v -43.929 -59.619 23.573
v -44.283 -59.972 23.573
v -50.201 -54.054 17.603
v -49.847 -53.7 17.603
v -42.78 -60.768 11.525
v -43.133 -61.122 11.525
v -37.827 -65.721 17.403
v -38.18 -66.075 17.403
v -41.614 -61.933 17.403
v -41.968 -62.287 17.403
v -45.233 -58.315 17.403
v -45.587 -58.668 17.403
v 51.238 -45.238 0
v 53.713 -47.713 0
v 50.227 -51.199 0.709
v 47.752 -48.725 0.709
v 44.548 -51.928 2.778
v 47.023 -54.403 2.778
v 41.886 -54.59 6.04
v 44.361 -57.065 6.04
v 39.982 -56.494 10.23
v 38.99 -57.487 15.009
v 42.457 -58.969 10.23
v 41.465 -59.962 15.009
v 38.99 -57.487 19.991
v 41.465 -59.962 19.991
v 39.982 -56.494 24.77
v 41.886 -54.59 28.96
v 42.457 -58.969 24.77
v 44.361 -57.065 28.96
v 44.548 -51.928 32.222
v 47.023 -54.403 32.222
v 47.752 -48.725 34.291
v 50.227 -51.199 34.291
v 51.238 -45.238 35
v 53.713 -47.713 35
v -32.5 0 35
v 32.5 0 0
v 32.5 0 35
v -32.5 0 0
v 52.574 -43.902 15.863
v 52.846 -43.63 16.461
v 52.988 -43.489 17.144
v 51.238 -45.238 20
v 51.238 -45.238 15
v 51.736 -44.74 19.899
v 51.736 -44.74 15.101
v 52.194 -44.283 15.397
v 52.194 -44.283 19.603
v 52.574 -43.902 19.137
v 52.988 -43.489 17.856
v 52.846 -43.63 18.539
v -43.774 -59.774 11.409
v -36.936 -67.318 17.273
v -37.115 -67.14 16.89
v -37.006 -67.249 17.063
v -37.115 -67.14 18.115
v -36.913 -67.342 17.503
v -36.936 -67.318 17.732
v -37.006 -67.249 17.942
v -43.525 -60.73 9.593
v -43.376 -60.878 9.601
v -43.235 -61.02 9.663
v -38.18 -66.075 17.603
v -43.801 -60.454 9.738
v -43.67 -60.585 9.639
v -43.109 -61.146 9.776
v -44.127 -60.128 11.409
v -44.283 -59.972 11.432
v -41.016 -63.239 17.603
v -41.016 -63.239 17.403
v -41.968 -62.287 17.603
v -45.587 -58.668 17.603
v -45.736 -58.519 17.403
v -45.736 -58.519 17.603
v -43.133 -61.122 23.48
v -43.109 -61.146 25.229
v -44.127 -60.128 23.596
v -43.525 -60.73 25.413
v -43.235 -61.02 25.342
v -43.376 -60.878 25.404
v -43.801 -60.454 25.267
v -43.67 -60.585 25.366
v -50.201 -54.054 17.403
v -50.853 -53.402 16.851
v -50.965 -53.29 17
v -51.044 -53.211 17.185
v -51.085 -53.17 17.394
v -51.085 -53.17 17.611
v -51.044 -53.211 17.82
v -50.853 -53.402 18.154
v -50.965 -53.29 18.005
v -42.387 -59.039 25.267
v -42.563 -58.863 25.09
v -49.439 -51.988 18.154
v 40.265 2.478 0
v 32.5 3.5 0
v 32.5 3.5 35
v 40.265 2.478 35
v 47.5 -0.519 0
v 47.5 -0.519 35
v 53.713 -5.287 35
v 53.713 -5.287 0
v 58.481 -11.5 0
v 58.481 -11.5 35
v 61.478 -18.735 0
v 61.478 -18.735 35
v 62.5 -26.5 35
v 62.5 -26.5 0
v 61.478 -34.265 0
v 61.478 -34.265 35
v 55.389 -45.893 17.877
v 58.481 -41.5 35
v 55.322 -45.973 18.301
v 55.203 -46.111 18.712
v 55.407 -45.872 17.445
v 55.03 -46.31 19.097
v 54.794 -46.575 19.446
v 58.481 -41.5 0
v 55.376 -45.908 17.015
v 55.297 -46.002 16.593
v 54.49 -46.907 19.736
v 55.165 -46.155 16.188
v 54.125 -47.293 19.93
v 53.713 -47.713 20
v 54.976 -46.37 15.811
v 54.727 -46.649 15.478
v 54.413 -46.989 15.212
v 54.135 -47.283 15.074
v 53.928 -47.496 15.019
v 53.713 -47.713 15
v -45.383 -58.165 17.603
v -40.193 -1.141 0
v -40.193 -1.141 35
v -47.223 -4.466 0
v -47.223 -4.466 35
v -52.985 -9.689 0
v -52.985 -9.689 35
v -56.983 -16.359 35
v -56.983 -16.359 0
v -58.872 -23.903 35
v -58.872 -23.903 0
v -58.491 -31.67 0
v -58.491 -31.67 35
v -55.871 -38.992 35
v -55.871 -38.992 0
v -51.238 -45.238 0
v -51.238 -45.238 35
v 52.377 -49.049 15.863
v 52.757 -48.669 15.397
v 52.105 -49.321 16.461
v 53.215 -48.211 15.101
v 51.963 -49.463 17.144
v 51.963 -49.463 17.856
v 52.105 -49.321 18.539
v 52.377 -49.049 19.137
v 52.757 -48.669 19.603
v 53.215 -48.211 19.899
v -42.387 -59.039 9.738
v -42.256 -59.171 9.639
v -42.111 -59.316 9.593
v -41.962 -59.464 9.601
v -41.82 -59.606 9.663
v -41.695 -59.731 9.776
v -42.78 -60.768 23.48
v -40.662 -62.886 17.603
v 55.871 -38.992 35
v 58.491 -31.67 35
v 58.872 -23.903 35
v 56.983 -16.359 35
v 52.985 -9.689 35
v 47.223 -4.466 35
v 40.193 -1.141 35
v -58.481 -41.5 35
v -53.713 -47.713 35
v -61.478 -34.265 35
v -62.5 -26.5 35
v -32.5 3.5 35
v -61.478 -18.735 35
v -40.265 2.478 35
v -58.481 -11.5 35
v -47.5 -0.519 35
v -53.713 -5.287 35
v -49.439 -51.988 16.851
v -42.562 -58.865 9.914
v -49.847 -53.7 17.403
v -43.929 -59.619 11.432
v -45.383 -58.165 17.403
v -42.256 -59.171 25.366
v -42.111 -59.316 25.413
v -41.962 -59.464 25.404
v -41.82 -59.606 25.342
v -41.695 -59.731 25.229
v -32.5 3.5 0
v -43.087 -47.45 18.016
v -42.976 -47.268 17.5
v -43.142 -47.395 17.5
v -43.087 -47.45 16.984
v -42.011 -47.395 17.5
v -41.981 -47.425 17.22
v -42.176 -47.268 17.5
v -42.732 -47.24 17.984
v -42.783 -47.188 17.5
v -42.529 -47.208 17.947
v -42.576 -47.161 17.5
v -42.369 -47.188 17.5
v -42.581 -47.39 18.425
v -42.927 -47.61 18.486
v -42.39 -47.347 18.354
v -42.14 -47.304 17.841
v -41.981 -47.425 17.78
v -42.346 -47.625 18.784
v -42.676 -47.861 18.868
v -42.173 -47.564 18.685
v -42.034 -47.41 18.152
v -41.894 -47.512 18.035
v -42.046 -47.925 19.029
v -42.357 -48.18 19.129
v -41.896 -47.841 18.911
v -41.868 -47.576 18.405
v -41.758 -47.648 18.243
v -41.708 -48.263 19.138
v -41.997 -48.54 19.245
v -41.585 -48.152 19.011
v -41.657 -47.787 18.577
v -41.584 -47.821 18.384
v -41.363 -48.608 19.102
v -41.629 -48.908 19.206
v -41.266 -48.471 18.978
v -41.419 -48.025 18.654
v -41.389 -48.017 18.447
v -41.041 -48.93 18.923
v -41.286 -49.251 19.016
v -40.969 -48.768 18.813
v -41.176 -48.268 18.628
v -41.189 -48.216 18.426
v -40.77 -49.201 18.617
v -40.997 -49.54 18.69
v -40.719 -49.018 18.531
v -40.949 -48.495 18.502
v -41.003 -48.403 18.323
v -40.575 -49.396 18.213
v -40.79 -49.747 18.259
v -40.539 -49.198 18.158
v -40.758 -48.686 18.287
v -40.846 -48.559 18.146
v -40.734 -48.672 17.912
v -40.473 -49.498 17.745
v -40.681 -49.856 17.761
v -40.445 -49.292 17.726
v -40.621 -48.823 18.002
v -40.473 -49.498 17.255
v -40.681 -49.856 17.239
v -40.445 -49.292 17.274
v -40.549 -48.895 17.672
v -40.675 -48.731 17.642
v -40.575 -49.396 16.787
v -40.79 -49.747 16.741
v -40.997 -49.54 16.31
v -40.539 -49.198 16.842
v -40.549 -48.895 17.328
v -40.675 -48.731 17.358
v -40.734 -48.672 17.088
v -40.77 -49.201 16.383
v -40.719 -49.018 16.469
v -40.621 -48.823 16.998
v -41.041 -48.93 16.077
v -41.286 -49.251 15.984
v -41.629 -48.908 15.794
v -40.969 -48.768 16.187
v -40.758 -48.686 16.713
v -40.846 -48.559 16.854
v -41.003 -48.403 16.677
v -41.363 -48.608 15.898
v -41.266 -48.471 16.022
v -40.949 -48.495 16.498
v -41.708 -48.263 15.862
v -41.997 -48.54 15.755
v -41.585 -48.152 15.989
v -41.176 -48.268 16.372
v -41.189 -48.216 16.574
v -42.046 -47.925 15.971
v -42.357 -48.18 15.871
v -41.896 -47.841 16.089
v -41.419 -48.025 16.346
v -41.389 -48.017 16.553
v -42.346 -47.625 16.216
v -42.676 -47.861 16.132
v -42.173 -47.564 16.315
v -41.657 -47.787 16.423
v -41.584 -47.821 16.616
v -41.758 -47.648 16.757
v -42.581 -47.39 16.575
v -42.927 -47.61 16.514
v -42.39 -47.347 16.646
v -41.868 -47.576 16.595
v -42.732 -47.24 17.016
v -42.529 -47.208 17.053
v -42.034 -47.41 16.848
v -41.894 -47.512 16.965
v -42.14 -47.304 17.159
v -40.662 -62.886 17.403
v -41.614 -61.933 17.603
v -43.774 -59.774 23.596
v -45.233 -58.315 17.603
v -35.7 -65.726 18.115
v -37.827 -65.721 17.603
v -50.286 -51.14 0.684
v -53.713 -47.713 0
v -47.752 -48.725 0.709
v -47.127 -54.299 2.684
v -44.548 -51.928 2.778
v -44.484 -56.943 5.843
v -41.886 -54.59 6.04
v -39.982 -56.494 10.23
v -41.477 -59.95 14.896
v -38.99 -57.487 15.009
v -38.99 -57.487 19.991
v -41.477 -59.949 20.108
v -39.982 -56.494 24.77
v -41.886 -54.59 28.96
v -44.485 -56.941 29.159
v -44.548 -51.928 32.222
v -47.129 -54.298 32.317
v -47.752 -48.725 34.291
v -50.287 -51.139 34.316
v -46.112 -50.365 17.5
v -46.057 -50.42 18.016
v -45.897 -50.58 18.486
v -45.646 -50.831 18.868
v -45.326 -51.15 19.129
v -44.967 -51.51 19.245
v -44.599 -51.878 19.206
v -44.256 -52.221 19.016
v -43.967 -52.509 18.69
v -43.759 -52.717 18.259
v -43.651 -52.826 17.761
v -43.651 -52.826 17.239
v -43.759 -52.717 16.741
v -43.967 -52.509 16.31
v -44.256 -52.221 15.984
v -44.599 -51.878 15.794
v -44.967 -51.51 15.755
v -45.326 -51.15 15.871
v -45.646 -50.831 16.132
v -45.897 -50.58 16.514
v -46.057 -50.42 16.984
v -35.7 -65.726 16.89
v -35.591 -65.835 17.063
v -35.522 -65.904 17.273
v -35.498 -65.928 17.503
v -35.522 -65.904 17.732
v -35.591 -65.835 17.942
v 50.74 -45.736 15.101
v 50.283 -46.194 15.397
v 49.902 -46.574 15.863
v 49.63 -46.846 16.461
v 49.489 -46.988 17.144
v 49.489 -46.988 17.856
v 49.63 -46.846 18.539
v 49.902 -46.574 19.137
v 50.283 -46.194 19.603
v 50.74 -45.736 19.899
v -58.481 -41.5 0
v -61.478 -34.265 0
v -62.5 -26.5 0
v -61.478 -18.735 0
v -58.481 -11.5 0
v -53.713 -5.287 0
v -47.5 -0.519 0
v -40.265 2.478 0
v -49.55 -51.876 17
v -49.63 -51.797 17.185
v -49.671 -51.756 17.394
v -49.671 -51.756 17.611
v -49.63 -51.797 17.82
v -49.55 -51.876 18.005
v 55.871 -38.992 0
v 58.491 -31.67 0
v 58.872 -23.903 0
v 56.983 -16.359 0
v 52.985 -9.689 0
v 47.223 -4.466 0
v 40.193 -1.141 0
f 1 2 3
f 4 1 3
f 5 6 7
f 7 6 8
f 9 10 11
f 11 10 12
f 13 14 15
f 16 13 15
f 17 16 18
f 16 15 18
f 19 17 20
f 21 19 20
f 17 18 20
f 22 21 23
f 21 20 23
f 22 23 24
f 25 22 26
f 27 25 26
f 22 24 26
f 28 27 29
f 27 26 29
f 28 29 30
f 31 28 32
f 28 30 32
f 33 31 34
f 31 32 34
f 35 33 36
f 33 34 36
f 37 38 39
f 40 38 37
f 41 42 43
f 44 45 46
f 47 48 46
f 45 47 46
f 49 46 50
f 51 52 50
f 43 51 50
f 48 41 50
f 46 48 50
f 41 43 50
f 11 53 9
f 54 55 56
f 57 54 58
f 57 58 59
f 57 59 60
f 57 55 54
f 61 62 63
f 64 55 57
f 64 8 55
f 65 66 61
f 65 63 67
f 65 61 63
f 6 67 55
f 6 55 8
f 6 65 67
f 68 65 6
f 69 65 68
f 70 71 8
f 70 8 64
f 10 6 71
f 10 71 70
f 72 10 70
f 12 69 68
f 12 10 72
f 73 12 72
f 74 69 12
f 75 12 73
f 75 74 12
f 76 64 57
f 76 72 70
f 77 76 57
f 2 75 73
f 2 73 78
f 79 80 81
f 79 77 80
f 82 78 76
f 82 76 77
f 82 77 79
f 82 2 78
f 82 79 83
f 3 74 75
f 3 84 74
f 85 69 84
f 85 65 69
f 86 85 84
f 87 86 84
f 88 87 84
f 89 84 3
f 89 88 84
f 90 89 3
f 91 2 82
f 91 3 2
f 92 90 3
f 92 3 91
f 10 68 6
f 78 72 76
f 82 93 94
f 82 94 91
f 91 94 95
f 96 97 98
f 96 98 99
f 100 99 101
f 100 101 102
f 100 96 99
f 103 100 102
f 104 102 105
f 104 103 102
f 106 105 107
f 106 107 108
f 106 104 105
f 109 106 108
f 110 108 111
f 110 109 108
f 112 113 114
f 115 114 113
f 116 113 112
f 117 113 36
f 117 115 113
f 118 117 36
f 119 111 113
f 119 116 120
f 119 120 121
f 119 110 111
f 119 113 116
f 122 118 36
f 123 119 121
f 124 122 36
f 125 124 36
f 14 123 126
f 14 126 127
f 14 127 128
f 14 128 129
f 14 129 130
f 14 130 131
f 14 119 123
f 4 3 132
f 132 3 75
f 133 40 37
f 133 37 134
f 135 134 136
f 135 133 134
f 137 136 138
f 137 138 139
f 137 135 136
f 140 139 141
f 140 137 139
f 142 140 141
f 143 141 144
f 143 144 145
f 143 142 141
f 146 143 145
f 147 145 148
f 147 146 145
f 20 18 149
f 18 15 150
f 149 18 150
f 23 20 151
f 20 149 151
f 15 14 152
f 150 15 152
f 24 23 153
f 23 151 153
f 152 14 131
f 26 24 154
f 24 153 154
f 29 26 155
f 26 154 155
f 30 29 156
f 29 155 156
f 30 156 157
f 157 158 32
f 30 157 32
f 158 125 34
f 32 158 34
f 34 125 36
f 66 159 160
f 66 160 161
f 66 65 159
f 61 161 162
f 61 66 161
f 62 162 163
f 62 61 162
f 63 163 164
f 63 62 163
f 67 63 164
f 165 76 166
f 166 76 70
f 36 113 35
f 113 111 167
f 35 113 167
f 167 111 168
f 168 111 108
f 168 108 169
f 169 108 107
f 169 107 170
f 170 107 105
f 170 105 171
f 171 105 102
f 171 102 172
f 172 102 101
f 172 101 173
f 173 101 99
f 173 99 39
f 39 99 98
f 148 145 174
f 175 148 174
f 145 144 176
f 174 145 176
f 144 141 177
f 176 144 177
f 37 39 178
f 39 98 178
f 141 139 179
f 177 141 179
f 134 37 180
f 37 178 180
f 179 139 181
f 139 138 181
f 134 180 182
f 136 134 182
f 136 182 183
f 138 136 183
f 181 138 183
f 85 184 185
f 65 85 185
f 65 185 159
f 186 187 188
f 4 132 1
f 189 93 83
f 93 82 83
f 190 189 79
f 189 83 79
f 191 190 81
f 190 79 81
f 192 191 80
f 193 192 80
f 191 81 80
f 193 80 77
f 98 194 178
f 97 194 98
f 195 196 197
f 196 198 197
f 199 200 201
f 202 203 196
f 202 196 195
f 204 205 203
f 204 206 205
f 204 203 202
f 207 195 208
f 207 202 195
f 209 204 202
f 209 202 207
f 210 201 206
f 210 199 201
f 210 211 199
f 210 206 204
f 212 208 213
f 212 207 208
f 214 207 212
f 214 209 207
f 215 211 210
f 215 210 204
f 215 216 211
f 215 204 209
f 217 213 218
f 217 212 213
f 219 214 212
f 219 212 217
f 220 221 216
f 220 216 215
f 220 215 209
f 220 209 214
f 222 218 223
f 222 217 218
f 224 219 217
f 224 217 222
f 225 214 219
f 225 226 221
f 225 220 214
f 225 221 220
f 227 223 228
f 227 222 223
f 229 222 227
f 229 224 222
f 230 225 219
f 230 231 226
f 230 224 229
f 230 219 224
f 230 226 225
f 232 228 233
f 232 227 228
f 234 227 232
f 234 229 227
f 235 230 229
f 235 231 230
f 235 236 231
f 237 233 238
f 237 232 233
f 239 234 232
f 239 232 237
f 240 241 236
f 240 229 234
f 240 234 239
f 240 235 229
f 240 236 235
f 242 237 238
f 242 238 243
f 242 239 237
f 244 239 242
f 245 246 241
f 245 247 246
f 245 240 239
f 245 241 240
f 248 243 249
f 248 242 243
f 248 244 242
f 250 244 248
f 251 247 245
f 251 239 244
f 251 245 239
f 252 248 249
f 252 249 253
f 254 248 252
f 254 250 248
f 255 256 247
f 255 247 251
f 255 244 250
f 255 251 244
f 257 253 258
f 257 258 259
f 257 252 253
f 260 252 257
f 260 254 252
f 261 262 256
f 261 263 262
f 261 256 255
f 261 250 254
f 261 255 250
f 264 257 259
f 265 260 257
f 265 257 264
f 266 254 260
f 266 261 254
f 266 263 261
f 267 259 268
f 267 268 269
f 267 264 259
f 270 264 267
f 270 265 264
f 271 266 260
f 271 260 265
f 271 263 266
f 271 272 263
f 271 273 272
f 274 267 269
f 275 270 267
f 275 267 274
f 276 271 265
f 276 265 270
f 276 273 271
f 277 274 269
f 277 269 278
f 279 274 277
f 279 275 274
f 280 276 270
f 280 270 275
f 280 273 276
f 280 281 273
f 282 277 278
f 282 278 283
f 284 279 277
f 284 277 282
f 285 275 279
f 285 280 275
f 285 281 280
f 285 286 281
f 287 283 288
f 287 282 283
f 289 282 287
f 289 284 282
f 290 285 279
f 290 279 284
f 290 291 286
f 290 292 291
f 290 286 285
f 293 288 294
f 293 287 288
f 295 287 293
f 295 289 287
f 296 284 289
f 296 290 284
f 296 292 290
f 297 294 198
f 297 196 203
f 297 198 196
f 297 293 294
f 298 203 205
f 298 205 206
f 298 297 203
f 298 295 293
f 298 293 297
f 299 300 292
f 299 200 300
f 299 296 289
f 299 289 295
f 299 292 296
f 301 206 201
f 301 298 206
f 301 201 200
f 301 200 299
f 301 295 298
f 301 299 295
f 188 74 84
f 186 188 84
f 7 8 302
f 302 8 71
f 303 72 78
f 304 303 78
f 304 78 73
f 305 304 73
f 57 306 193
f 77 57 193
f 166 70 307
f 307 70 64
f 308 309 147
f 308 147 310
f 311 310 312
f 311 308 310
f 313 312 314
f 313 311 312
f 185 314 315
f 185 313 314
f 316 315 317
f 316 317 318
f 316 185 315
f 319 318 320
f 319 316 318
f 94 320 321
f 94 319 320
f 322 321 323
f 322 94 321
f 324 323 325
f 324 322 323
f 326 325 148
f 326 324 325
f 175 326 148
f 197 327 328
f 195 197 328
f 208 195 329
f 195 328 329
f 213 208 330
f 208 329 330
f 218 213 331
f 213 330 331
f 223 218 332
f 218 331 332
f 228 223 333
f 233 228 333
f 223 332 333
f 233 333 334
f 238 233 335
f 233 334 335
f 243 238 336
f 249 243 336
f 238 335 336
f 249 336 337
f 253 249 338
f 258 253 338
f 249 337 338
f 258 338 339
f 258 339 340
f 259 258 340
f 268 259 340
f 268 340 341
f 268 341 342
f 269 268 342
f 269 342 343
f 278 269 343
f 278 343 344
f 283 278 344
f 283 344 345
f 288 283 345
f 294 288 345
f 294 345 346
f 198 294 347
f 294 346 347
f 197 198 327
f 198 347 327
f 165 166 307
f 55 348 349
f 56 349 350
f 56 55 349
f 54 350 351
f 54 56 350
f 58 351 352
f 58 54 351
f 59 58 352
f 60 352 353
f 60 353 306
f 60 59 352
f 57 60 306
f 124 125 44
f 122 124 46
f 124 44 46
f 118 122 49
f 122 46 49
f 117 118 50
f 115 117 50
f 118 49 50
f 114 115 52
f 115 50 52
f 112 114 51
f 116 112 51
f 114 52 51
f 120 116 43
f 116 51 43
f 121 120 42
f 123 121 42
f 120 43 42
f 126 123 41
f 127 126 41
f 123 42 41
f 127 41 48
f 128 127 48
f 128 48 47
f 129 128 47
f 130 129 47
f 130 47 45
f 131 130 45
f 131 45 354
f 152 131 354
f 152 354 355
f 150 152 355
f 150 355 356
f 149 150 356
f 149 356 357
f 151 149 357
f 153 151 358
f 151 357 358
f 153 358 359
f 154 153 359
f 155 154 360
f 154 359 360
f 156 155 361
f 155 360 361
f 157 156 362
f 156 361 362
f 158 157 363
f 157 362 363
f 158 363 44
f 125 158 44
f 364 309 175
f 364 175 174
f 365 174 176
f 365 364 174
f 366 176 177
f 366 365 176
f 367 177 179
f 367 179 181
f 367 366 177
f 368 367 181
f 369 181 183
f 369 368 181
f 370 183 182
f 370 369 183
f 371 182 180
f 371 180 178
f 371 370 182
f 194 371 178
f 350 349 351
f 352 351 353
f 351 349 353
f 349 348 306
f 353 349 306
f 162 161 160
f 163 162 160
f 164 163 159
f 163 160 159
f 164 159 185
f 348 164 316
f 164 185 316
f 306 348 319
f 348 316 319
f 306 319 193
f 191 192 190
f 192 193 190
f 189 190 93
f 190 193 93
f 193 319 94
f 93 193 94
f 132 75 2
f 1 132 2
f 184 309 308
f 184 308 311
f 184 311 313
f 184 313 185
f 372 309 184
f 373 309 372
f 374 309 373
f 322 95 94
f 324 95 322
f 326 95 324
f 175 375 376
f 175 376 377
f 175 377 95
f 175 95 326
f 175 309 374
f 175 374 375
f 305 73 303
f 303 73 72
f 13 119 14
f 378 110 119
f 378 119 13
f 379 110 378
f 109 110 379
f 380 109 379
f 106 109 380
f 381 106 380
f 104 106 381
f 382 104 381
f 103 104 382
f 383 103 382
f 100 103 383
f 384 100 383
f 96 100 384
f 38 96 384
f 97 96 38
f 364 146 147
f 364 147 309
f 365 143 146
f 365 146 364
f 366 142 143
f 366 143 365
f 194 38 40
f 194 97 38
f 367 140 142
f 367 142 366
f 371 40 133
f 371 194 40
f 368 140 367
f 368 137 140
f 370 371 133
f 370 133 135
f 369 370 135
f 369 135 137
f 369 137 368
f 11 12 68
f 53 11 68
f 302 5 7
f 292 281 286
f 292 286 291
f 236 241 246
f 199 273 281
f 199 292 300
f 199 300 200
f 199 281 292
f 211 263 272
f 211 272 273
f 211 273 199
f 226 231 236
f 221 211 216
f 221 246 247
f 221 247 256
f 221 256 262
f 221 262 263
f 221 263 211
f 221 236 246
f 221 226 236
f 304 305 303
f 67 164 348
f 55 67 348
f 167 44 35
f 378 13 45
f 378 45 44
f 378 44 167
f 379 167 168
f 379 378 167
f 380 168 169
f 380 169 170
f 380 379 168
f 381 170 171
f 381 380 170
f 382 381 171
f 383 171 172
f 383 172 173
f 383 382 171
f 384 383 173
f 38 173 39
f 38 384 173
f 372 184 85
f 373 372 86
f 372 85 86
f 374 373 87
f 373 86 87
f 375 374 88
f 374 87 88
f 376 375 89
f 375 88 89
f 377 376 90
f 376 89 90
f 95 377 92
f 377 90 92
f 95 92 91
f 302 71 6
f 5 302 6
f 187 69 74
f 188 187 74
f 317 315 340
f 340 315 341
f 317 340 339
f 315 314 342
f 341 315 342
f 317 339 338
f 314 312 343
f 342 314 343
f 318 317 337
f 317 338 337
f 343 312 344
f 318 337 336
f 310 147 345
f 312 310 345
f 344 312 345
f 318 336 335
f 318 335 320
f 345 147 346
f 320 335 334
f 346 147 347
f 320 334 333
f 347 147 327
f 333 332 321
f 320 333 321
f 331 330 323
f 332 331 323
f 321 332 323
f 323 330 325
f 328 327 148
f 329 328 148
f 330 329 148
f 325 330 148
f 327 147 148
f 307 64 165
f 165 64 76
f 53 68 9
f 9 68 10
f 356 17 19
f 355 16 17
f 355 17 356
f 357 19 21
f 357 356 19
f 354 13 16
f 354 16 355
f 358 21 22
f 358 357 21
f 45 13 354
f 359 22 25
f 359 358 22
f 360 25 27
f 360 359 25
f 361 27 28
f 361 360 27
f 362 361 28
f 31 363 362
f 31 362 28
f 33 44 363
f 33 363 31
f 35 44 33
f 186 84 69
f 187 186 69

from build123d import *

# Parameters (mm, degrees)
BOSS_EXTRUDE1_DEPTH = 35
BOSS_EXTRUDE2_DEPTH = 3.5
BOSS_EXTRUDE3_DEPTH = 2
CUT_EXTRUDE2_DEPTH  = 0.5
FILLET1_R           = 0.8
SKETCH5_R           = 1.75
BOSS_EXTRUDE4_DEPTH = 5
FILLET2_R           = 0.8
SKETCH6_R           = 2.5
CUT_EXTRUDE4_DEPTH  = 128.140994275


with BuildPart() as part:
    # Sketch1 → Boss-Extrude1 (new body)
    with BuildSketch(Plane.XY):
        with BuildLine():
            ThreePointArc((32.5, 3.5), (60.216385975, -15.019497029), (53.713203436, -47.713203436))
            Line((53.713203436, -47.713203436), (51.238329701, -45.238329701))
            ThreePointArc((51.238329701, -45.238329701), (56.982807612, -16.358889042), (32.5, 0))
            Line((32.5, 0), (-32.5, 0))
            ThreePointArc((-32.5, 0), (-56.982807612, -16.358889042), (-51.238329701, -45.238329701))
            Line((-51.238329701, -45.238329701), (-53.713203436, -47.713203436))
            ThreePointArc((-53.713203436, -47.713203436), (-60.216385975, -15.019497029), (-32.5, 3.5))
            Line((-32.5, 3.5), (32.5, 3.5))
        make_face()
    extrude(amount=BOSS_EXTRUDE1_DEPTH)

    # Sketch2 → Boss-Extrude2 (add)
    with BuildSketch(Plane(origin=(-50.713203436, -50.713203436, 0), x_dir=(0, 0, 1), z_dir=(-0.7071067811865488, -0.7071067811865464, 0))):
        with BuildLine():
            Line((35, 4.242640687), (0, 4.242640687))
            ThreePointArc((0, 4.242640687), (17.5, -13.257359313), (35, 4.242640687))
        make_face()
    boss_extrude2 = extrude(amount=-BOSS_EXTRUDE2_DEPTH)

    # Mirror1: Boss-Extrude2 across plane
    add(boss_extrude2.mirror(Plane(origin=(0, 0, 0), x_dir=(0, 0, 1), z_dir=(1, 0, 0))))

    # Sketch3 → Boss-Extrude3 (add)
    with BuildSketch(Plane(origin=(-50.713203436, -50.713203436, 0), x_dir=(0, 0, 1), z_dir=(-0.7071067811865487, -0.7071067811865465, 0))):
        Polygon((17.502560815, -0.889154327), (9.378087293, -12.279246125), (17.502560815, -21.961616632), (25.627034337, -12.279246125), align=None)
    extrude(amount=BOSS_EXTRUDE3_DEPTH)

    # Sketch4 → Cut-Extrude2 (cut)
    with BuildSketch(Plane(origin=(-52.127416998, -52.127416998, 0), x_dir=(0, 0, 1), z_dir=(-0.7071067811865486, -0.7071067811865465, 0))):
        Polygon((11.432409465, -11.094265864), (17.402560815, -9.038577899), (17.402560815, -2.724422361), align=None)
        Polygon((17.602560815, -9.038577899), (23.572712164, -11.094265864), (17.602560815, -2.724422361), align=None)
        Polygon((17.402560815, -9.250102035), (11.40902714, -11.31384118), (17.402560815, -14.36769912), align=None)
        Polygon((17.602560815, -14.36769912), (23.59609449, -11.31384118), (17.602560815, -9.250102035), align=None)
        Polygon((17.402560815, -15.714490605), (11.524861695, -12.719653319), (17.402560815, -19.724422361), align=None)
        Polygon((17.602560815, -19.724422361), (23.480259935, -12.719653319), (17.602560815, -15.714490605), align=None)
    extrude(amount=-CUT_EXTRUDE2_DEPTH, mode=Mode.SUBTRACT)

    # Fillet1
    fillet1_edges = [part.edges().sort_by_distance(p)[0] for p in [
        (-42.737572014, -60.103048419, 25.627034337),
        (-50.791583162, -52.049037271, 17.502560815),
        (-42.737572014, -60.103048419, 9.378087293),
        (-35.89110217, -66.949518263, 17.502560815),
    ]]
    fillet(fillet1_edges, radius=FILLET1_R)

    # Sketch5 → Boss-Extrude4 (add)
    with BuildSketch(Plane(origin=(-48.238329701, -48.238329701, 0), x_dir=(0, 0, -1), z_dir=(0.7071067811865487, 0.7071067811865465, 0))):
        with Locations(Location((-17.5, -4.757359313, 0), (0, 0, 90))):
            Circle(SKETCH5_R)
    extrude(amount=BOSS_EXTRUDE4_DEPTH)

    # Fillet2
    fillet2_edges = [part.edges().sort_by_distance(p)[0] for p in [
        (-40.101397898, -49.304193693, 17.5),
    ]]
    fillet(fillet2_edges, radius=FILLET2_R)

    # Sketch6 → Cut-Extrude4 (cut, through all)
    with BuildSketch(Plane(origin=(48.238329701, -48.238329701, 0), x_dir=(0, 0, 1), z_dir=(-0.7071067811865487, 0.7071067811865465, 0))):
        with Locations((17.5, 4.242640687)):
            Circle(SKETCH6_R)
    extrude(amount=-CUT_EXTRUDE4_DEPTH, mode=Mode.SUBTRACT)


solid = part.part
